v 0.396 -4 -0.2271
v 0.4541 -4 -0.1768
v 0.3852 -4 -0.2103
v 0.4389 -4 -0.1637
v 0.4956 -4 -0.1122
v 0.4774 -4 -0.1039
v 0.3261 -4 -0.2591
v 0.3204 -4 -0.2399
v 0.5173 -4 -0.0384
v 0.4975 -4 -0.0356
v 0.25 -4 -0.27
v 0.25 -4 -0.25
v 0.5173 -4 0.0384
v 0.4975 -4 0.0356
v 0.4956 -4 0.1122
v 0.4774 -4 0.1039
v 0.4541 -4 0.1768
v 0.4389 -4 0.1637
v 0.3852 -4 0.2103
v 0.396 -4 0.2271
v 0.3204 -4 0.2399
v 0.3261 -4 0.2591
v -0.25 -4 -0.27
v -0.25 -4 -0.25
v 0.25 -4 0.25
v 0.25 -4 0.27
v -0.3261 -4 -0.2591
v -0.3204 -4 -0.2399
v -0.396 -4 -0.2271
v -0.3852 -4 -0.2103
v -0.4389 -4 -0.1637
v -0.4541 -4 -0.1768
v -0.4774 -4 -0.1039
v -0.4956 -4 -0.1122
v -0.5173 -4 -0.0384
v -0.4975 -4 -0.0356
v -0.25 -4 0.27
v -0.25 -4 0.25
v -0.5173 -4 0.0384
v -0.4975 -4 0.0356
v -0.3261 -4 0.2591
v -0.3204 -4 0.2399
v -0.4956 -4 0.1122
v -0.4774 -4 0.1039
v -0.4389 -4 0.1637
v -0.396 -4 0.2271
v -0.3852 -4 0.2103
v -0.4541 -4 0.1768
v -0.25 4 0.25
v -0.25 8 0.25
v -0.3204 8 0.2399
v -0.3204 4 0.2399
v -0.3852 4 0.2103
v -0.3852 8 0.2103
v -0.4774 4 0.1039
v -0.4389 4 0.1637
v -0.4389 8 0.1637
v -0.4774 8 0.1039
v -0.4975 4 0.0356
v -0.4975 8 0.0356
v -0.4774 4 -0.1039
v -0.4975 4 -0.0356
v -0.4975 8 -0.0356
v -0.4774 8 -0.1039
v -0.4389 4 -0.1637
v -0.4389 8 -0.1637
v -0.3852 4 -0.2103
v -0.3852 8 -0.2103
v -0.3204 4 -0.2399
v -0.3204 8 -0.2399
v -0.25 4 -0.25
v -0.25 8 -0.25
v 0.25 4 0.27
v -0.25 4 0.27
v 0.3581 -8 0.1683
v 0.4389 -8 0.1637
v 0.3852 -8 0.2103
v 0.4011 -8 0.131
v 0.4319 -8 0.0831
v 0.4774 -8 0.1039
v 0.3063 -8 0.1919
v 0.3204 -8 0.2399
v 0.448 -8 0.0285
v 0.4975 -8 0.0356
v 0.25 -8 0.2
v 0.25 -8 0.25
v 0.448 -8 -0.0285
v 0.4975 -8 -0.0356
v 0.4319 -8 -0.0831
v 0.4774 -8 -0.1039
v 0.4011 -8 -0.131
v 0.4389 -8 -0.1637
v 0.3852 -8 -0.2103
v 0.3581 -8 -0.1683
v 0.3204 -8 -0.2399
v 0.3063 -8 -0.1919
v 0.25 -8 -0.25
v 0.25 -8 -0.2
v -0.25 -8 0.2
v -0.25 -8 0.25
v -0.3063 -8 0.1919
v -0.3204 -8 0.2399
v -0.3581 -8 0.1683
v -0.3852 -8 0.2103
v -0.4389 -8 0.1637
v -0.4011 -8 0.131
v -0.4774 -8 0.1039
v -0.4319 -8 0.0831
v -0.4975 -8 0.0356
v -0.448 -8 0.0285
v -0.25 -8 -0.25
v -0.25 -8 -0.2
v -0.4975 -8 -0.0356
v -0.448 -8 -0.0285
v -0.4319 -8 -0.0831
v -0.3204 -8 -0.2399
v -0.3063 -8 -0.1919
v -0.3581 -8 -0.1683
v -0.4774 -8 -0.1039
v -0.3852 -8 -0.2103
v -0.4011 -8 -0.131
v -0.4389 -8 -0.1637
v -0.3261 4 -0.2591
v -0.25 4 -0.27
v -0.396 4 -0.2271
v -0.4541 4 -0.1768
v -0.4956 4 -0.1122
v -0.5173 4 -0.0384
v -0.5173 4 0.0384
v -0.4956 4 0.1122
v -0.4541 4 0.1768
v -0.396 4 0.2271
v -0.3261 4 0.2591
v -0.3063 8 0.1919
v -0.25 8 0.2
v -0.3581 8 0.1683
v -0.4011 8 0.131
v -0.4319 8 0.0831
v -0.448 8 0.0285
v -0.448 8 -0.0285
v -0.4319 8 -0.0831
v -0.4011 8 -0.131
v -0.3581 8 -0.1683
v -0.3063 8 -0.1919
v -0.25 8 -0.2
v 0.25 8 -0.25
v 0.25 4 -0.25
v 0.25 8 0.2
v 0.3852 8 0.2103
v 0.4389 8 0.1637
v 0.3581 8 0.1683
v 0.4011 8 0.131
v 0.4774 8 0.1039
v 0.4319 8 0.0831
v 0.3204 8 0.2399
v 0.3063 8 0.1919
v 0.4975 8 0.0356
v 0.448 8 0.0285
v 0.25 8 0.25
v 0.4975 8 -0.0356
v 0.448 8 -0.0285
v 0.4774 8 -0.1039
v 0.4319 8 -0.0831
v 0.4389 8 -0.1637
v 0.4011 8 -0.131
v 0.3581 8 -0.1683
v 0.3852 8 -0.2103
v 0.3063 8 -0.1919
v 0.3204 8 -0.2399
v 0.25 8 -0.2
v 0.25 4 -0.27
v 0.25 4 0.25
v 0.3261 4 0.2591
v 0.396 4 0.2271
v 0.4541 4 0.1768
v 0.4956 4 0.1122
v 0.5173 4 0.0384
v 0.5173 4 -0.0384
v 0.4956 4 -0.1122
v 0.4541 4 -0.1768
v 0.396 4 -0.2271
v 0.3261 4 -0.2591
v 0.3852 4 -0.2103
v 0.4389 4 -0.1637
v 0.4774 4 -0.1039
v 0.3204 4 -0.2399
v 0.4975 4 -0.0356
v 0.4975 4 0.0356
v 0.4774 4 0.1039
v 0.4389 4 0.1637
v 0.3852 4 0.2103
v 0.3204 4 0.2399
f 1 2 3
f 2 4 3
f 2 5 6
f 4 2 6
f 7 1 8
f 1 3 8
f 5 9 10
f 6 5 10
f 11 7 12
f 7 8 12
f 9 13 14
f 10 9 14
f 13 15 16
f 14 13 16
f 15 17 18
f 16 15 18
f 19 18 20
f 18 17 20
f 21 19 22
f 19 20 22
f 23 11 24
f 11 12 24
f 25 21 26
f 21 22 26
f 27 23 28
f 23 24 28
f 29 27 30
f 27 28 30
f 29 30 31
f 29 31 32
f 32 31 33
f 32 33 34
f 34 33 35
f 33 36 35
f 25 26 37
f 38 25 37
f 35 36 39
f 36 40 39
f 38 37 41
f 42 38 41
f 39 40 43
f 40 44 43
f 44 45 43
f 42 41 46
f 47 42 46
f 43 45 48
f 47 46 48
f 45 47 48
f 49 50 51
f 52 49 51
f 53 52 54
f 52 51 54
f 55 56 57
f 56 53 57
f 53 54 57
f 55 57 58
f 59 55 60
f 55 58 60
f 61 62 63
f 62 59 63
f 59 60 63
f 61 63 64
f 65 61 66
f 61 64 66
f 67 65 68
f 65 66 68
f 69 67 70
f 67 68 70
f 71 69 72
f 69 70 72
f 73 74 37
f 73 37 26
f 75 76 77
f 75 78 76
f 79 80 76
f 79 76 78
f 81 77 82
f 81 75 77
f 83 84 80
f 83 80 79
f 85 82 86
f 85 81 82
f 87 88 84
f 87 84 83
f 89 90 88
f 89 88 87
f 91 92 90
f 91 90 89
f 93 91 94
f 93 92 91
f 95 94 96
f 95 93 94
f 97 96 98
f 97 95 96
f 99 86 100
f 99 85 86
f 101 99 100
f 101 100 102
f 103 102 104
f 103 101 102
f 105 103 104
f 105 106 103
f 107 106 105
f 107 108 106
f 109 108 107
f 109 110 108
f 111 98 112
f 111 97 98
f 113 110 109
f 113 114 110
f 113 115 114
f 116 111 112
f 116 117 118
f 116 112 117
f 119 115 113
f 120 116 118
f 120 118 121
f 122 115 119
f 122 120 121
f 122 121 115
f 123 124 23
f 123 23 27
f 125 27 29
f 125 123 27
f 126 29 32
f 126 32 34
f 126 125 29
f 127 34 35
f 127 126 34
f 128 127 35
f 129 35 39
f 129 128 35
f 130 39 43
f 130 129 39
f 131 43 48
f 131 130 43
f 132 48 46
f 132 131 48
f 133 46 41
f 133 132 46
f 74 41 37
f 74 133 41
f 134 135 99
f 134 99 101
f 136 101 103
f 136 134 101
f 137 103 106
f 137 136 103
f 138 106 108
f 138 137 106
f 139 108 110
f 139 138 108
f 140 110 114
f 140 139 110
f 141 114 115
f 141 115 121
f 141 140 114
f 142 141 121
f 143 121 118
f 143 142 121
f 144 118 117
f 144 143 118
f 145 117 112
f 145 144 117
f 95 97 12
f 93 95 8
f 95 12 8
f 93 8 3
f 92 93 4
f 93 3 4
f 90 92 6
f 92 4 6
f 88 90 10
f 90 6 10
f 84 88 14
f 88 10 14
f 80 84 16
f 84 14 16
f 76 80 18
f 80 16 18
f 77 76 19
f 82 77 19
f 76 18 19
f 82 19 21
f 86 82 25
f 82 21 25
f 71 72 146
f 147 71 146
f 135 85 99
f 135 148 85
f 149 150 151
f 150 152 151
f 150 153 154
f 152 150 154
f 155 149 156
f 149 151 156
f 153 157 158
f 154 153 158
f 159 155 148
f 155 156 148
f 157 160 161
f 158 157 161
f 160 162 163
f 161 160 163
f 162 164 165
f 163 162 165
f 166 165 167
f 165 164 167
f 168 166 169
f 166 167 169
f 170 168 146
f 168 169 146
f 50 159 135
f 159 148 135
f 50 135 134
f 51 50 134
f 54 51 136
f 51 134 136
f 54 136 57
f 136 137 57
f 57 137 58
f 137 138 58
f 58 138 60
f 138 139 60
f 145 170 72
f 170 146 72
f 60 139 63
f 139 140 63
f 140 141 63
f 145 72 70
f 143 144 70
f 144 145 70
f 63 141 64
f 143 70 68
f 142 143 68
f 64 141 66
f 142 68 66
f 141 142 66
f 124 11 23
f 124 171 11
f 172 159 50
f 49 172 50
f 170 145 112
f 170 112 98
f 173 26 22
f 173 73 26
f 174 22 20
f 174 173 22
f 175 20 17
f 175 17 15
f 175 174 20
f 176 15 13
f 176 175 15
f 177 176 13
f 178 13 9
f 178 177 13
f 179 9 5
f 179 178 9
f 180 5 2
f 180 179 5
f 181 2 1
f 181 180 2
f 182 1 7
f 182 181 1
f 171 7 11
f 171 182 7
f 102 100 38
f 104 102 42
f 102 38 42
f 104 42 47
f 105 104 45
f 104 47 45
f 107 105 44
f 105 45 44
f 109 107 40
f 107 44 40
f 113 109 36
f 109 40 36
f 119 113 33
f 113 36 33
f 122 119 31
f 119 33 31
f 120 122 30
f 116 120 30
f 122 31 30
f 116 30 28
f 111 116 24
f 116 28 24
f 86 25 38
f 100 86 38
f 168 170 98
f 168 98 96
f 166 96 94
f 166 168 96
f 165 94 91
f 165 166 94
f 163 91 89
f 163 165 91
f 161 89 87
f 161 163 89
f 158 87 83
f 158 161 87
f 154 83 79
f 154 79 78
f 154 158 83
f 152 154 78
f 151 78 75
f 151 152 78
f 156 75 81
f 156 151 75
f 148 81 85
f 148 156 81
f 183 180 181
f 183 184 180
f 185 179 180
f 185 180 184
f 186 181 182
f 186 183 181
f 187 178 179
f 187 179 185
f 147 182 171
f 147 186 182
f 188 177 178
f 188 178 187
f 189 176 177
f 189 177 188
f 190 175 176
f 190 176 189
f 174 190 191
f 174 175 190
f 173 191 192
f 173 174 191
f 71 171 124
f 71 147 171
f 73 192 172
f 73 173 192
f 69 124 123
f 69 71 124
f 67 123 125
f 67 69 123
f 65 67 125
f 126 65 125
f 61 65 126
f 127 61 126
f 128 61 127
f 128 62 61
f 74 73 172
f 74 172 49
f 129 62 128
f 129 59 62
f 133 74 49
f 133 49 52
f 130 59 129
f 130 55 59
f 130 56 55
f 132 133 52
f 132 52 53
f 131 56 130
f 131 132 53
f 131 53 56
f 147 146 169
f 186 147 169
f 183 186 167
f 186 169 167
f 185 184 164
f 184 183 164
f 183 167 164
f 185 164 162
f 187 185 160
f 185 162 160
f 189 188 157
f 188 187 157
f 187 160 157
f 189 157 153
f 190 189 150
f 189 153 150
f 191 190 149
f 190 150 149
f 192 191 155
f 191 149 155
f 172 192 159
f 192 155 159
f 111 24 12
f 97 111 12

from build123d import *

# Parameters (mm, degrees)
EXTRUDE_THIN2_DEPTH      = 8
EXTRUDE_THIN2_DEPTH_BACK = 8
EXTRUDE_THIN4_DEPTH      = 4
EXTRUDE_THIN4_DEPTH_BACK = 4


with BuildPart() as part:
    # Sketch1 → Extrude-Thin2 (new body, two sides)
    with BuildSketch(Plane(origin=(0, 0, 0), x_dir=(1, 0, 0), z_dir=(0, 1, 0))) as extrude_thin2_sk:
        with BuildLine():
            Line((0.25, -0.25), (-0.25, -0.25))
            ThreePointArc((-0.25, -0.25), (-0.5, 0), (-0.25, 0.25))
            Line((-0.25, 0.25), (0.25, 0.25))
            ThreePointArc((0.25, 0.25), (0.5, 0), (0.25, -0.25))
        make_face()
        with BuildLine():
            Line((0.25, -0.2), (-0.25, -0.2))
            ThreePointArc((-0.25, -0.2), (-0.45, 0), (-0.25, 0.2))
            Line((-0.25, 0.2), (0.25, 0.2))
            ThreePointArc((0.25, 0.2), (0.45, 0), (0.25, -0.2))
        make_face(mode=Mode.SUBTRACT)
    extrude(amount=EXTRUDE_THIN2_DEPTH)
    extrude(extrude_thin2_sk.sketch, amount=-EXTRUDE_THIN2_DEPTH_BACK)

    # Sketch2 → Extrude-Thin4 (add, two sides)
    with BuildSketch(Plane(origin=(0, 0, 0), x_dir=(-1, 0, 0), z_dir=(0, 1, 0))) as extrude_thin4_sk:
        with BuildLine():
            Line((-0.25, -0.27), (0.25, -0.27))
            ThreePointArc((0.25, -0.27), (0.52, 0), (0.25, 0.27))
            Line((0.25, 0.27), (-0.25, 0.27))
            ThreePointArc((-0.25, 0.27), (-0.52, 0), (-0.25, -0.27))
        make_face()
        with BuildLine():
            Line((-0.25, -0.25), (0.25, -0.25))
            ThreePointArc((0.25, -0.25), (0.5, 0), (0.25, 0.25))
            Line((0.25, 0.25), (-0.25, 0.25))
            ThreePointArc((-0.25, 0.25), (-0.5, 0), (-0.25, -0.25))
        make_face(mode=Mode.SUBTRACT)
    extrude(amount=EXTRUDE_THIN4_DEPTH)
    extrude(extrude_thin4_sk.sketch, amount=-EXTRUDE_THIN4_DEPTH_BACK)


solid = part.part
